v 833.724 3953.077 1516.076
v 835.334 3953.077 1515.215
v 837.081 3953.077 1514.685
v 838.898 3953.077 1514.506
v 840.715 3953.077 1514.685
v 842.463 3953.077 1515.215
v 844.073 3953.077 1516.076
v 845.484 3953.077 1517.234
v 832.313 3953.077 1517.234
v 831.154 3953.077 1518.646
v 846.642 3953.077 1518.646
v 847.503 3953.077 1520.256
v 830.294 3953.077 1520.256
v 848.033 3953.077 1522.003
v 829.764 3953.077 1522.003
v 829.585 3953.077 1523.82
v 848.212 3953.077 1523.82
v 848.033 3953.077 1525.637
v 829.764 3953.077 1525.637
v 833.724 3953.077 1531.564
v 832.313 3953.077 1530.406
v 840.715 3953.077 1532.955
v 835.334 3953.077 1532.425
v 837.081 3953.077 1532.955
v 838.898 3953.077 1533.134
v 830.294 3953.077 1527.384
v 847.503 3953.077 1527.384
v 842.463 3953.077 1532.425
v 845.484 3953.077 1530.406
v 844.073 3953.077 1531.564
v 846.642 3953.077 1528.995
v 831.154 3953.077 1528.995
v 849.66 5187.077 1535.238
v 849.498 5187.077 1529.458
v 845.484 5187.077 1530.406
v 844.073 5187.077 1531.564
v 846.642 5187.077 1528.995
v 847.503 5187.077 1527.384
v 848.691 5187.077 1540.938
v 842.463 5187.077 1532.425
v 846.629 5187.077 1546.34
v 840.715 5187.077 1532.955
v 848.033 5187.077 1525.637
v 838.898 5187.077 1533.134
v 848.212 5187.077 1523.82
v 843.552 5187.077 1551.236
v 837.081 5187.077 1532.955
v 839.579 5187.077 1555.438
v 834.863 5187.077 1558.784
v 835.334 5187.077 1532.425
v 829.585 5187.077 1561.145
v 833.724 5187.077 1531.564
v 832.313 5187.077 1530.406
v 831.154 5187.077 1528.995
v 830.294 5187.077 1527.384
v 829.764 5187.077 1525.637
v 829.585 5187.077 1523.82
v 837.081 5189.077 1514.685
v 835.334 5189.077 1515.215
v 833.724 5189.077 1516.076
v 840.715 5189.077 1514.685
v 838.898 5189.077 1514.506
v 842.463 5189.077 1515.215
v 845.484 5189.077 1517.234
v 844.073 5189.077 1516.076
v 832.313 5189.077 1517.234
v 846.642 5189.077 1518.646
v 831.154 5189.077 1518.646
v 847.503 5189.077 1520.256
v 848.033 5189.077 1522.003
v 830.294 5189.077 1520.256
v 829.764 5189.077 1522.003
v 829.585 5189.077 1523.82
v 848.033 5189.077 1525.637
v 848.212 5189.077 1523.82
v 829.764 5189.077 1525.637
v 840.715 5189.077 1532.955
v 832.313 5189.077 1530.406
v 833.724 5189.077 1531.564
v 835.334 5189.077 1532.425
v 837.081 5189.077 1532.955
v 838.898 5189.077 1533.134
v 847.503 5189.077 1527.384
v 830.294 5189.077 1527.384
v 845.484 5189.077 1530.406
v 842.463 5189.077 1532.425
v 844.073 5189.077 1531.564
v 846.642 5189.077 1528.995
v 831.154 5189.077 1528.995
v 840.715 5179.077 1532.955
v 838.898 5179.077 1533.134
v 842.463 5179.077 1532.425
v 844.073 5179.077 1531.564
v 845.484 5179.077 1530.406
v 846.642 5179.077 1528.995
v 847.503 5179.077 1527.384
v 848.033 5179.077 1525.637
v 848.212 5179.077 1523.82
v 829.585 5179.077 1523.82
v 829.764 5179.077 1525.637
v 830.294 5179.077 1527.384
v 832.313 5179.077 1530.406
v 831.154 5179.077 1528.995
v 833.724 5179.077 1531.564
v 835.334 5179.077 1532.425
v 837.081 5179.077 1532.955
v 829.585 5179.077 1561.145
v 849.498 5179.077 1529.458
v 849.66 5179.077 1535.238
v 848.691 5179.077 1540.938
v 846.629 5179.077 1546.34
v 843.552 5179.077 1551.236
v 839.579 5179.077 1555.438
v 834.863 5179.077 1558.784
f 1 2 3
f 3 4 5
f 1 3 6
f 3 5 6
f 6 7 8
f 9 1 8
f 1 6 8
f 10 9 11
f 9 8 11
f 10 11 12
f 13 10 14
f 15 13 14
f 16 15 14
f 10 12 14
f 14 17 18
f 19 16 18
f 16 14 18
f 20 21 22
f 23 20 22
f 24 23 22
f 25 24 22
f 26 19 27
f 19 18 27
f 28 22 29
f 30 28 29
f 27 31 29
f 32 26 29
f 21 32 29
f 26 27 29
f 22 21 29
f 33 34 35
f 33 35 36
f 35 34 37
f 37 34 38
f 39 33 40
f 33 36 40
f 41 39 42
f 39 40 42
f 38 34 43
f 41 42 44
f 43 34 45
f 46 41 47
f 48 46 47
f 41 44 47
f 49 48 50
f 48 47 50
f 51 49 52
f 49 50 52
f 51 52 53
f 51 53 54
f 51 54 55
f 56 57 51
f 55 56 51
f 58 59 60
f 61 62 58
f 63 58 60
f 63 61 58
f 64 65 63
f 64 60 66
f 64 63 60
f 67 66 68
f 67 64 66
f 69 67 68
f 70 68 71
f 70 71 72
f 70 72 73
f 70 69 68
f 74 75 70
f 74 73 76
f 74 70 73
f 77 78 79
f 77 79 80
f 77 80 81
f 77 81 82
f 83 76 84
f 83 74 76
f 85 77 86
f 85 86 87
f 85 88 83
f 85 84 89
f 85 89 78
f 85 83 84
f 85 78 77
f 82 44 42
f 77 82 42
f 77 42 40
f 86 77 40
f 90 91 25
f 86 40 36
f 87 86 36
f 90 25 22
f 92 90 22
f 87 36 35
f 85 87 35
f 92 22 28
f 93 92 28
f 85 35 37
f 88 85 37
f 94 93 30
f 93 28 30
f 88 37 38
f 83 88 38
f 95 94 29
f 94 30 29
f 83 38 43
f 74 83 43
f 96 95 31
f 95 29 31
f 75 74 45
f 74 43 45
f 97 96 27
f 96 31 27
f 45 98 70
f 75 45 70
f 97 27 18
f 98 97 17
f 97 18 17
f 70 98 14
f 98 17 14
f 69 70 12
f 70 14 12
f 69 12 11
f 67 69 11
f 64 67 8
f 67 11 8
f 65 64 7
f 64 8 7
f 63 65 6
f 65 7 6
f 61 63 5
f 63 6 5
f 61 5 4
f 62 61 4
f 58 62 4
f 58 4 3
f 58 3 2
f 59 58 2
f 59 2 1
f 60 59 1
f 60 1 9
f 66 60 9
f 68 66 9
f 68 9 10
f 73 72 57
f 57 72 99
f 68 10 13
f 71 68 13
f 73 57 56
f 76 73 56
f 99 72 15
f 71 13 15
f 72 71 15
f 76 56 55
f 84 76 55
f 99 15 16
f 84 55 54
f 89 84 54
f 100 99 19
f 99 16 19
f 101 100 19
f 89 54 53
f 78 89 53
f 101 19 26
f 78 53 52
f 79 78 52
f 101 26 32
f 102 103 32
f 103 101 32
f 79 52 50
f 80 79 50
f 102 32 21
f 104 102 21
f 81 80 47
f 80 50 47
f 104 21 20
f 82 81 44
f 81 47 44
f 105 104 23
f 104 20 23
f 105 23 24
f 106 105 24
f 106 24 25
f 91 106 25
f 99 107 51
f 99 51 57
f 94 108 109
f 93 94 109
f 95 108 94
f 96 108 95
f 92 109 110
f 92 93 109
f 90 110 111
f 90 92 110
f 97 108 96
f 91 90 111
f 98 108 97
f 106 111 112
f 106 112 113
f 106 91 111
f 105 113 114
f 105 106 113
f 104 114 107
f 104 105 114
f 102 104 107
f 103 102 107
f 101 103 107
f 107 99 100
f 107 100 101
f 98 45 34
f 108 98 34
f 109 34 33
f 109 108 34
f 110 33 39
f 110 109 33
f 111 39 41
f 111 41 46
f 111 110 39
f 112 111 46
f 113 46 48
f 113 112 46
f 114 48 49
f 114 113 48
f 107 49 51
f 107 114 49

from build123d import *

# Parameters (mm, degrees)
BOSS_EXTRUDE1_DEPTH      = 950
BOSS_EXTRUDE1_DEPTH_BACK = 286
SKETCH1_R                = 9.313662058
BOSS_EXTRUDE2_DEPTH      = 3
BOSS_EXTRUDE2_DEPTH_BACK = 5
BOSS_EXTRUDE2_START      = -5


with BuildPart() as part:
    # Sketch1 → Boss-Extrude1 (new, two sides: drawn at the far end of the back side and taken through both)
    with BuildSketch(Plane(origin=(0, 4239.077255807, 0), x_dir=(1, 0, 0), z_dir=(0, 1, 0)).offset(-BOSS_EXTRUDE1_DEPTH_BACK)):
        with Locations(Location((838.898443774, -1523.820122511, 0), (0, 0, 270))):
            Circle(SKETCH1_R)
    extrude(amount=BOSS_EXTRUDE1_DEPTH + BOSS_EXTRUDE1_DEPTH_BACK)

    # Sketch2 → Boss-Extrude2 (add, two sides: drawn at the far end of the back side and taken through both)
    with BuildSketch(Plane(origin=(0, 5189.077255807, 0), x_dir=(1, 0, 0), z_dir=(0, 1, 0)).offset(BOSS_EXTRUDE2_START - BOSS_EXTRUDE2_DEPTH_BACK)):
        with BuildLine():
            Line((829.584781716, -1561.145044768), (829.584781716, -1523.820122511))
            Line((829.584781716, -1523.820122511), (848.212105832, -1523.820122511))
            ThreePointArc((848.212105832, -1523.820122511), (846.628688281, -1546.340428779), (829.584781716, -1561.145044768))
        make_face()
    extrude(amount=BOSS_EXTRUDE2_DEPTH + BOSS_EXTRUDE2_DEPTH_BACK)


solid = part.part
